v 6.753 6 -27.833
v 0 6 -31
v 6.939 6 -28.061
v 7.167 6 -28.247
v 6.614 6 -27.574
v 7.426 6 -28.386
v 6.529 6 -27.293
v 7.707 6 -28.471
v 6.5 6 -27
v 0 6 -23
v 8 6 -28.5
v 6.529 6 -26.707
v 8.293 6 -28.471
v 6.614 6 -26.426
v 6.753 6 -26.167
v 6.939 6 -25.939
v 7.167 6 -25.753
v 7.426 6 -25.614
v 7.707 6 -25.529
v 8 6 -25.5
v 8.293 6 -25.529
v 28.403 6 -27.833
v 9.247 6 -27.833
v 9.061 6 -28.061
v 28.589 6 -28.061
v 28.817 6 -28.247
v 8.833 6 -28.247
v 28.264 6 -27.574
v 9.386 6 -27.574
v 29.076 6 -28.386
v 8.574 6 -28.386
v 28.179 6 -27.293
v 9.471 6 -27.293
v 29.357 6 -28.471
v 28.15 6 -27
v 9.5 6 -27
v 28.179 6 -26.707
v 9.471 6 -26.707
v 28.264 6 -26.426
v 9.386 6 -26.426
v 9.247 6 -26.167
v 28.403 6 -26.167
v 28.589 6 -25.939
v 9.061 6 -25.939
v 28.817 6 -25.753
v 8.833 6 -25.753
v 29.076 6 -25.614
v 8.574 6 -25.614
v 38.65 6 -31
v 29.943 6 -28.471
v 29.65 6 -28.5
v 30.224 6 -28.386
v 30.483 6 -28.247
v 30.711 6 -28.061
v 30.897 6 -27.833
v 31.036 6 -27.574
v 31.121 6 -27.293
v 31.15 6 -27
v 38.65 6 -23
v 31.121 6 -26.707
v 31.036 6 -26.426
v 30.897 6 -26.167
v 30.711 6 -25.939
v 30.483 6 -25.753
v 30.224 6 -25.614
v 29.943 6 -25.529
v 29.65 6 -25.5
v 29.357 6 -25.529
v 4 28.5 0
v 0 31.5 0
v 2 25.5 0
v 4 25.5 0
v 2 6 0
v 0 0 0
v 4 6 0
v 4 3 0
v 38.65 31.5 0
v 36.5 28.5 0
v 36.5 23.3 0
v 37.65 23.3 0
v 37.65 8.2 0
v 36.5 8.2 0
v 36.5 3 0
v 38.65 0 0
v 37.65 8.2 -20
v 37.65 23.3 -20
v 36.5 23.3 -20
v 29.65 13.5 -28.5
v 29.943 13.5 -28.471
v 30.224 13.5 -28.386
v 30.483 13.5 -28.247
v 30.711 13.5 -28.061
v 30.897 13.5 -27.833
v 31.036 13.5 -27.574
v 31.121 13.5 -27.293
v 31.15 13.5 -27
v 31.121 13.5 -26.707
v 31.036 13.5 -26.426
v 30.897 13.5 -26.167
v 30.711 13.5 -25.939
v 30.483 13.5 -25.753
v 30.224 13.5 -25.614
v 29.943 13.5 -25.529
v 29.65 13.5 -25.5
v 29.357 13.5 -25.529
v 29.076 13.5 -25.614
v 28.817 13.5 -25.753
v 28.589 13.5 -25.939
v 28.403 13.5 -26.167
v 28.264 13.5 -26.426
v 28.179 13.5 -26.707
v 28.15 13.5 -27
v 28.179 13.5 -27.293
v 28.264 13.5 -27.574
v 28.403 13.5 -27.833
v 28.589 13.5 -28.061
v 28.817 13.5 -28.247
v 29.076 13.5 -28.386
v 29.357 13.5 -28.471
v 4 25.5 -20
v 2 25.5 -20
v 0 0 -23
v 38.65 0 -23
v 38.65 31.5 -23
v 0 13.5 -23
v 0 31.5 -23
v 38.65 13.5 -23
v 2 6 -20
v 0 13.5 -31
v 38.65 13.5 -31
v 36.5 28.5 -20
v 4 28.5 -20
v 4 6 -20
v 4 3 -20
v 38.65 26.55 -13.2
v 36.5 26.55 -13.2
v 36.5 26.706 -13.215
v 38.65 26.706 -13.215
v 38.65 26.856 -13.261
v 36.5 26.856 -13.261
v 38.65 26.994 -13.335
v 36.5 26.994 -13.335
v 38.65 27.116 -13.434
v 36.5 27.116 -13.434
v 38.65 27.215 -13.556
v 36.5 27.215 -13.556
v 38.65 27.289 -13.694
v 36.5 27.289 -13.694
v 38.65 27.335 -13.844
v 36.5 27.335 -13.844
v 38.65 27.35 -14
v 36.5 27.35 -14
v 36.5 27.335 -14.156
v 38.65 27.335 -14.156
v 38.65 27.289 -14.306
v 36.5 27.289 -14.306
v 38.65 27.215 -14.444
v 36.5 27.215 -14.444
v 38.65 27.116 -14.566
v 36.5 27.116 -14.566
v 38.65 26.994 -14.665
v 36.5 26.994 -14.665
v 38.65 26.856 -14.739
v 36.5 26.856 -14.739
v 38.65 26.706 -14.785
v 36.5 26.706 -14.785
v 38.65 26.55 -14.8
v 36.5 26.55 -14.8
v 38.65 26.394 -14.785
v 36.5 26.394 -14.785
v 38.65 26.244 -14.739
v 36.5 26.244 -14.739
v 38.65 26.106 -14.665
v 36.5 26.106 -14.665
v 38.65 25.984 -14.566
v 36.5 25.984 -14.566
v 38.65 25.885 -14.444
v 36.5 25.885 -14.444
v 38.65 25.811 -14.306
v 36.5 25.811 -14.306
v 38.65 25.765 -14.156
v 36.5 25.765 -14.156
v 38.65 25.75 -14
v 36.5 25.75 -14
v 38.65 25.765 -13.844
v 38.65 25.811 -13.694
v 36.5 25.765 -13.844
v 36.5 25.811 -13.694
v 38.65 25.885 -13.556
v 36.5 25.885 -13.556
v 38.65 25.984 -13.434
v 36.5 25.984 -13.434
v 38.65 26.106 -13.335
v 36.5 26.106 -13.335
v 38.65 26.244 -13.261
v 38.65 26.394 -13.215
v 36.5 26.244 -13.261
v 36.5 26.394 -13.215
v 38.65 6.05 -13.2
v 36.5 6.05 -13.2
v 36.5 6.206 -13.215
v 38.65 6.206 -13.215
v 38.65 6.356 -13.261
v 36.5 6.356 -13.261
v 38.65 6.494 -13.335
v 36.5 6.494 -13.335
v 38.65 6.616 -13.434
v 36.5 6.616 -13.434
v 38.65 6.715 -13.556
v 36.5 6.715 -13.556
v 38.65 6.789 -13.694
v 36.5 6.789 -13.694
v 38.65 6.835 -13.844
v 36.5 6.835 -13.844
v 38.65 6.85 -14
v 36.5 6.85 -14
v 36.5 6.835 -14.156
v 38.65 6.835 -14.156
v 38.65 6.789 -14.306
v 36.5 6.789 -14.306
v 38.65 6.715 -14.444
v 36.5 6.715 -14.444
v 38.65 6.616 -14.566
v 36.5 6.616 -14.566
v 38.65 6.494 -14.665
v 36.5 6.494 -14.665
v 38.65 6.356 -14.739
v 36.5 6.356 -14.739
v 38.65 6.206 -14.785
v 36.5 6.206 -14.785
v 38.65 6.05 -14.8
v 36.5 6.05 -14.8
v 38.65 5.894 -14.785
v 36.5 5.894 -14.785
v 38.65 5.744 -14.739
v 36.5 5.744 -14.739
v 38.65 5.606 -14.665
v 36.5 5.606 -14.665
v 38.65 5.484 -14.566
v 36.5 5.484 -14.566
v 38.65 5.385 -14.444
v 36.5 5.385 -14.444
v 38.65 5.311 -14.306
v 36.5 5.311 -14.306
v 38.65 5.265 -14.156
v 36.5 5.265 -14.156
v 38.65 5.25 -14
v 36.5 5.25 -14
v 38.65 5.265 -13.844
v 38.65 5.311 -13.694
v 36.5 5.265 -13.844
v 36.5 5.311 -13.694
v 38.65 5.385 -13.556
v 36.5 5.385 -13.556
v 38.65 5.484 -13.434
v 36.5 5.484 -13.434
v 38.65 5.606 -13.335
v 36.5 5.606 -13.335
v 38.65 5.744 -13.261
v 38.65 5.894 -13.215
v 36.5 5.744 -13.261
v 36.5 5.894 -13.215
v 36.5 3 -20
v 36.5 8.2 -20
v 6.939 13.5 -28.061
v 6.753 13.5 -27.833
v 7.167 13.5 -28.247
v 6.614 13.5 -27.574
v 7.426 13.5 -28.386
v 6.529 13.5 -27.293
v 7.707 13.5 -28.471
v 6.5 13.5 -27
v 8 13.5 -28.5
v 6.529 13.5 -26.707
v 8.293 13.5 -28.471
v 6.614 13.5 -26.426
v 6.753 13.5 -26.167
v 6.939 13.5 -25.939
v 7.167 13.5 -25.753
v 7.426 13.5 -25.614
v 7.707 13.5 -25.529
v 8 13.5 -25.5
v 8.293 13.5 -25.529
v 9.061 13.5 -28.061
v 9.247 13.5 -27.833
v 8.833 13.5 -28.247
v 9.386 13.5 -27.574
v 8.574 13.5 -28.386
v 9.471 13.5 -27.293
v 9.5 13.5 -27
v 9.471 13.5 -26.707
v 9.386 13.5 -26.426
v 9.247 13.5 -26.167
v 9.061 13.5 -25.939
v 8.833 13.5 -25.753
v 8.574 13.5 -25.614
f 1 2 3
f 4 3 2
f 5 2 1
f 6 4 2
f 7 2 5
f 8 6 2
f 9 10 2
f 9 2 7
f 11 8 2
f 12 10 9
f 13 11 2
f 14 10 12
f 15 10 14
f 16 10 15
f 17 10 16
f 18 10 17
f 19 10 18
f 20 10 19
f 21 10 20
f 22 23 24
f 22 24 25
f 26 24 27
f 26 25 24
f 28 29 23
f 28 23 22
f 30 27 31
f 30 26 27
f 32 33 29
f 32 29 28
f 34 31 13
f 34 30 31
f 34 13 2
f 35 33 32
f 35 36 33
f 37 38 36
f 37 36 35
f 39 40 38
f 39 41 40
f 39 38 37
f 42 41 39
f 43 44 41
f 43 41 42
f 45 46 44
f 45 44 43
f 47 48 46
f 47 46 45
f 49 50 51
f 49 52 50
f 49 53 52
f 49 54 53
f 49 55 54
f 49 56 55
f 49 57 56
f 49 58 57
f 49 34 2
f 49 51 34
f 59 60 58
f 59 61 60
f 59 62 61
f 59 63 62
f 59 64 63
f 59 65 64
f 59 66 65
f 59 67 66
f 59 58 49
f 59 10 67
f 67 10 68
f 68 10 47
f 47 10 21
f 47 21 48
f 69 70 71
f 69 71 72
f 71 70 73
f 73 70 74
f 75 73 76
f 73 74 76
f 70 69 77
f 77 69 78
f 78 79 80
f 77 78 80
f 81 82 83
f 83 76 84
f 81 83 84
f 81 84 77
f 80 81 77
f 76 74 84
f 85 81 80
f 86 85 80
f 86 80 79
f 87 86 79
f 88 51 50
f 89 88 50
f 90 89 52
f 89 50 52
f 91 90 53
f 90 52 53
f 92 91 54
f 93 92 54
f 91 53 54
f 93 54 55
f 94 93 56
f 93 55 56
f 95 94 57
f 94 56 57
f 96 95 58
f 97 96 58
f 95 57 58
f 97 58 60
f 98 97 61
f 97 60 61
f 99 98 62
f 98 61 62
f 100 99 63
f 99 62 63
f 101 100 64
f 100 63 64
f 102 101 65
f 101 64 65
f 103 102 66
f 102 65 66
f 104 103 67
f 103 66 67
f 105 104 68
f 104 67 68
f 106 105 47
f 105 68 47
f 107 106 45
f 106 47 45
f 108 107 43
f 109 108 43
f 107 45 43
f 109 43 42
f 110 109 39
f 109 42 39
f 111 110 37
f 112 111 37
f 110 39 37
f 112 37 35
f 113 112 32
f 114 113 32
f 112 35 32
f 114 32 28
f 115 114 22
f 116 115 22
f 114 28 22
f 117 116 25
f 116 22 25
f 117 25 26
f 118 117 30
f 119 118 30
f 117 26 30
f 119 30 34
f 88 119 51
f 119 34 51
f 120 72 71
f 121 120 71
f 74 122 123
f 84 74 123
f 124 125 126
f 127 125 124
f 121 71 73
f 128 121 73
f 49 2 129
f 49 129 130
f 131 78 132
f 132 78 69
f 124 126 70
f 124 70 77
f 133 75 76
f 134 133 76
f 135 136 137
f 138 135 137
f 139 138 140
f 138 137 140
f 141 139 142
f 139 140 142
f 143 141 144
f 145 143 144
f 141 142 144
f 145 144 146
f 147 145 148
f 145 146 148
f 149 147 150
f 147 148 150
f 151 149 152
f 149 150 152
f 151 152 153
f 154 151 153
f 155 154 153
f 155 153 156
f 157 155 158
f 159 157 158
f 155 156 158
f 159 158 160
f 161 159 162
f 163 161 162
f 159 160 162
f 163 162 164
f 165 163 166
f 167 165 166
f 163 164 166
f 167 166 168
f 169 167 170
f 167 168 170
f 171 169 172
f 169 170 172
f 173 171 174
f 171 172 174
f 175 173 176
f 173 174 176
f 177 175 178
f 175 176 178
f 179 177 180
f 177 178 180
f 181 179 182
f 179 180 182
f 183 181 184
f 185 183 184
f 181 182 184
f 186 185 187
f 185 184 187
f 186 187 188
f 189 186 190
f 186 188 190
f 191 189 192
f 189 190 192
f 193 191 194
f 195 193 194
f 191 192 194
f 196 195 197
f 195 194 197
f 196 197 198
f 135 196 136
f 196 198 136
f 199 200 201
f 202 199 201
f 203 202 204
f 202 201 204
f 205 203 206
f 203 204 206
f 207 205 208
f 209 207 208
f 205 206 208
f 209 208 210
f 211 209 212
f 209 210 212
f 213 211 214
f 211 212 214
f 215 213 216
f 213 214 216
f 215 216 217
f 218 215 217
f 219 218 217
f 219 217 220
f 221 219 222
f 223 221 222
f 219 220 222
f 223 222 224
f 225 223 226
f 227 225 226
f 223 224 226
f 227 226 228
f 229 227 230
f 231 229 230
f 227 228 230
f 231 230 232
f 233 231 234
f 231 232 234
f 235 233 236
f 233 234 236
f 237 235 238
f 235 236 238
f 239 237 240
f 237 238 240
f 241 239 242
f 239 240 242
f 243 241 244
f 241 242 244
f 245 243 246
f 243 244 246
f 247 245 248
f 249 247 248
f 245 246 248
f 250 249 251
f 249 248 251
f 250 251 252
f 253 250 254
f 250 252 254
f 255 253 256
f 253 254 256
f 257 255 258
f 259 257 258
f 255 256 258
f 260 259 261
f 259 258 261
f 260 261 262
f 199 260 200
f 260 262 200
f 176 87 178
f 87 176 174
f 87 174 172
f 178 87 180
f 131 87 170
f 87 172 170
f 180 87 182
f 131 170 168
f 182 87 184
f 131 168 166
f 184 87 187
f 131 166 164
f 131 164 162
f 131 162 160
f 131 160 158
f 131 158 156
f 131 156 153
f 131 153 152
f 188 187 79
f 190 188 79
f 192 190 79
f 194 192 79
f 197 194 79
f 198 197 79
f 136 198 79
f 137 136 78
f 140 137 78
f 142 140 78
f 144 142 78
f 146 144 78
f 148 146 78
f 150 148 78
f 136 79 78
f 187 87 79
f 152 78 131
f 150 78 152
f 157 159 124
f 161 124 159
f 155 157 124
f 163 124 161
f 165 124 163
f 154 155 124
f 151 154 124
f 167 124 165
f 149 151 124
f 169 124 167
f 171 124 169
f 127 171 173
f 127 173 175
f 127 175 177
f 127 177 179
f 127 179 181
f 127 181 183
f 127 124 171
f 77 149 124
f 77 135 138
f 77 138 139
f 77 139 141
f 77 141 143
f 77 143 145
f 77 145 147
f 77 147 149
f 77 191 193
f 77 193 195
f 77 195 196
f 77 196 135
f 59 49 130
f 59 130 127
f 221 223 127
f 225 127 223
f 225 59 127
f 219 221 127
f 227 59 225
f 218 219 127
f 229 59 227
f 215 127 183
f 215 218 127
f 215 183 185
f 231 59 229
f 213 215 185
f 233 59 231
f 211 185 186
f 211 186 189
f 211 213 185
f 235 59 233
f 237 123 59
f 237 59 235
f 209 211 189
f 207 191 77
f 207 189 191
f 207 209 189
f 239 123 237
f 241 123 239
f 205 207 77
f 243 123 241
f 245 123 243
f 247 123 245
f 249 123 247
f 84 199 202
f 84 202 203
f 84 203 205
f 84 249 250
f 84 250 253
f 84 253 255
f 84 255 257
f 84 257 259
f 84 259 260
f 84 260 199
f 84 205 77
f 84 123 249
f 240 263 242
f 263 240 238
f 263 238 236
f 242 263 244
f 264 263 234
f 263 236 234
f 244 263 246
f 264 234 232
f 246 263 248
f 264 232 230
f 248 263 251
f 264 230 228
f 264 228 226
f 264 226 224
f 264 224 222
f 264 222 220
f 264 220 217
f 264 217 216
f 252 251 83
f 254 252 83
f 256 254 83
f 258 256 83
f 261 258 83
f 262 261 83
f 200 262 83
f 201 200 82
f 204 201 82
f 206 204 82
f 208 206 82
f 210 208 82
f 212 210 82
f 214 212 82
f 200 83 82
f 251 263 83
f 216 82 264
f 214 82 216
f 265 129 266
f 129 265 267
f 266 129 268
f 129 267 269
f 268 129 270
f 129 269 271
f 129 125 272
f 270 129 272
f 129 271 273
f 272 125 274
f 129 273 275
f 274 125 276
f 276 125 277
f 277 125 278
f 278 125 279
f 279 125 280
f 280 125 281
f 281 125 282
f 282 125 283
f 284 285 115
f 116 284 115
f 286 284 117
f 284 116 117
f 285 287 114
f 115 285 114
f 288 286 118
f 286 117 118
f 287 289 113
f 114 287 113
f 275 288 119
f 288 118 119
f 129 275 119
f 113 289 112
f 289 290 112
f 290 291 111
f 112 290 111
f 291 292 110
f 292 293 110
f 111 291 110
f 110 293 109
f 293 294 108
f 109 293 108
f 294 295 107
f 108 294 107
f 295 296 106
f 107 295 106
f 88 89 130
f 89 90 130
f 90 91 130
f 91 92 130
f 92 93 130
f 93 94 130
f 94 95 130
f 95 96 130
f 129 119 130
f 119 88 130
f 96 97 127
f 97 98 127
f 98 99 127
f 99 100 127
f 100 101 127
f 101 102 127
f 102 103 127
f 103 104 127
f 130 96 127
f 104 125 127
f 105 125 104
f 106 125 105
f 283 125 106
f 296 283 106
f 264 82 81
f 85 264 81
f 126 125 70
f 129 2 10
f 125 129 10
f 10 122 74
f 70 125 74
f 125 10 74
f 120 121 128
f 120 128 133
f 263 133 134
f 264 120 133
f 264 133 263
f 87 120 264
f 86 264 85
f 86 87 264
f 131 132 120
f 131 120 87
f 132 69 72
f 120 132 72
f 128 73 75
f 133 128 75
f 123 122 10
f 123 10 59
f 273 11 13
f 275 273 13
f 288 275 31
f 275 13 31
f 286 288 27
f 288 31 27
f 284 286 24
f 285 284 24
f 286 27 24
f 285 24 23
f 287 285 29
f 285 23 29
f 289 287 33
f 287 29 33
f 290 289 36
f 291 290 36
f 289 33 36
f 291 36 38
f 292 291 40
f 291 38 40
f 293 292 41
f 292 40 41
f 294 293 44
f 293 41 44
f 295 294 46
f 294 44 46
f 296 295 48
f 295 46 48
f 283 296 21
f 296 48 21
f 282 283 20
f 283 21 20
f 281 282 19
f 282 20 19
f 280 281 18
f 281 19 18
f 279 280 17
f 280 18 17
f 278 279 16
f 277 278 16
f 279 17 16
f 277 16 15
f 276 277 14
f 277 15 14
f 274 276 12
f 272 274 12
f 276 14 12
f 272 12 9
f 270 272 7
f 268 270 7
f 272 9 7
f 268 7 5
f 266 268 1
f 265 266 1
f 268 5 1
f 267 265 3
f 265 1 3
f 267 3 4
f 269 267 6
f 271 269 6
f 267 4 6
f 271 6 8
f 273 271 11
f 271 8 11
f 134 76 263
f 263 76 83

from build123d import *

# Parameters (mm, degrees)
SKETCH1_W           = 38.65
SKETCH1_H           = 23
BOSS_EXTRUDE1_DEPTH = 31.5
CUT_EXTRUDE1_DEPTH  = 20
SKETCH4_R           = 0.8
CUT_EXTRUDE2_DEPTH  = 2.15
BOSS_EXTRUDE2_START = -6
SKETCH6_W           = 37.65
SKETCH6_H           = 8
SKETCH6_R           = 1.5
SKETCH6_W_2         = 1
BOSS_EXTRUDE2_DEPTH = 7.5


with BuildPart() as part:
    # Sketch1 → Boss-Extrude1 (new body)
    with BuildSketch(Plane(origin=(0, 0, 0), x_dir=(1, 0, 0), z_dir=(0, 1, 0))):
        with Locations((19.325, 11.5)):
            Rectangle(SKETCH1_W, SKETCH1_H)
    extrude(amount=BOSS_EXTRUDE1_DEPTH)

    # Sketch3 → Cut-Extrude1 (cut)
    with BuildSketch(Plane.XY):
        Polygon((2, 25.5), (2, 6), (4, 6), (4, 3), (36.5, 3), (36.5, 8.2), (37.65, 8.2), (37.65, 23.3), (36.5, 23.3), (36.5, 28.5), (4, 28.5), (4, 25.5), align=None)
    extrude(amount=-CUT_EXTRUDE1_DEPTH, mode=Mode.SUBTRACT)

    # Sketch4 → Cut-Extrude2 (cut)
    with BuildSketch(Plane.ZY.offset(-36.5)):
        with Locations((-14, 26.55)):
            Circle(SKETCH4_R)
        with Locations((-14, 6.05)):
            Circle(SKETCH4_R)
    extrude(amount=-CUT_EXTRUDE2_DEPTH, mode=Mode.SUBTRACT)

    # Sketch6 → Boss-Extrude2 (add)
    # profile 1 of 2: a face of its own
    with BuildSketch(Plane.XZ.offset(BOSS_EXTRUDE2_START)):
        with Locations((18.825, -27)):
            Rectangle(SKETCH6_W, SKETCH6_H)
        with Locations(Location((8, -27, 0), (0, 0, 270))):
            Circle(SKETCH6_R, mode=Mode.SUBTRACT)
        with Locations(Location((29.65, -27, 0), (0, 0, 270))):
            Circle(SKETCH6_R, mode=Mode.SUBTRACT)
    # profile 2 of 2: a face of its own
    with BuildSketch(Plane.XZ.offset(BOSS_EXTRUDE2_START)):
        with Locations((38.15, -27)):
            Rectangle(SKETCH6_W_2, SKETCH6_H)
    extrude(amount=-BOSS_EXTRUDE2_DEPTH)


solid = part.part
